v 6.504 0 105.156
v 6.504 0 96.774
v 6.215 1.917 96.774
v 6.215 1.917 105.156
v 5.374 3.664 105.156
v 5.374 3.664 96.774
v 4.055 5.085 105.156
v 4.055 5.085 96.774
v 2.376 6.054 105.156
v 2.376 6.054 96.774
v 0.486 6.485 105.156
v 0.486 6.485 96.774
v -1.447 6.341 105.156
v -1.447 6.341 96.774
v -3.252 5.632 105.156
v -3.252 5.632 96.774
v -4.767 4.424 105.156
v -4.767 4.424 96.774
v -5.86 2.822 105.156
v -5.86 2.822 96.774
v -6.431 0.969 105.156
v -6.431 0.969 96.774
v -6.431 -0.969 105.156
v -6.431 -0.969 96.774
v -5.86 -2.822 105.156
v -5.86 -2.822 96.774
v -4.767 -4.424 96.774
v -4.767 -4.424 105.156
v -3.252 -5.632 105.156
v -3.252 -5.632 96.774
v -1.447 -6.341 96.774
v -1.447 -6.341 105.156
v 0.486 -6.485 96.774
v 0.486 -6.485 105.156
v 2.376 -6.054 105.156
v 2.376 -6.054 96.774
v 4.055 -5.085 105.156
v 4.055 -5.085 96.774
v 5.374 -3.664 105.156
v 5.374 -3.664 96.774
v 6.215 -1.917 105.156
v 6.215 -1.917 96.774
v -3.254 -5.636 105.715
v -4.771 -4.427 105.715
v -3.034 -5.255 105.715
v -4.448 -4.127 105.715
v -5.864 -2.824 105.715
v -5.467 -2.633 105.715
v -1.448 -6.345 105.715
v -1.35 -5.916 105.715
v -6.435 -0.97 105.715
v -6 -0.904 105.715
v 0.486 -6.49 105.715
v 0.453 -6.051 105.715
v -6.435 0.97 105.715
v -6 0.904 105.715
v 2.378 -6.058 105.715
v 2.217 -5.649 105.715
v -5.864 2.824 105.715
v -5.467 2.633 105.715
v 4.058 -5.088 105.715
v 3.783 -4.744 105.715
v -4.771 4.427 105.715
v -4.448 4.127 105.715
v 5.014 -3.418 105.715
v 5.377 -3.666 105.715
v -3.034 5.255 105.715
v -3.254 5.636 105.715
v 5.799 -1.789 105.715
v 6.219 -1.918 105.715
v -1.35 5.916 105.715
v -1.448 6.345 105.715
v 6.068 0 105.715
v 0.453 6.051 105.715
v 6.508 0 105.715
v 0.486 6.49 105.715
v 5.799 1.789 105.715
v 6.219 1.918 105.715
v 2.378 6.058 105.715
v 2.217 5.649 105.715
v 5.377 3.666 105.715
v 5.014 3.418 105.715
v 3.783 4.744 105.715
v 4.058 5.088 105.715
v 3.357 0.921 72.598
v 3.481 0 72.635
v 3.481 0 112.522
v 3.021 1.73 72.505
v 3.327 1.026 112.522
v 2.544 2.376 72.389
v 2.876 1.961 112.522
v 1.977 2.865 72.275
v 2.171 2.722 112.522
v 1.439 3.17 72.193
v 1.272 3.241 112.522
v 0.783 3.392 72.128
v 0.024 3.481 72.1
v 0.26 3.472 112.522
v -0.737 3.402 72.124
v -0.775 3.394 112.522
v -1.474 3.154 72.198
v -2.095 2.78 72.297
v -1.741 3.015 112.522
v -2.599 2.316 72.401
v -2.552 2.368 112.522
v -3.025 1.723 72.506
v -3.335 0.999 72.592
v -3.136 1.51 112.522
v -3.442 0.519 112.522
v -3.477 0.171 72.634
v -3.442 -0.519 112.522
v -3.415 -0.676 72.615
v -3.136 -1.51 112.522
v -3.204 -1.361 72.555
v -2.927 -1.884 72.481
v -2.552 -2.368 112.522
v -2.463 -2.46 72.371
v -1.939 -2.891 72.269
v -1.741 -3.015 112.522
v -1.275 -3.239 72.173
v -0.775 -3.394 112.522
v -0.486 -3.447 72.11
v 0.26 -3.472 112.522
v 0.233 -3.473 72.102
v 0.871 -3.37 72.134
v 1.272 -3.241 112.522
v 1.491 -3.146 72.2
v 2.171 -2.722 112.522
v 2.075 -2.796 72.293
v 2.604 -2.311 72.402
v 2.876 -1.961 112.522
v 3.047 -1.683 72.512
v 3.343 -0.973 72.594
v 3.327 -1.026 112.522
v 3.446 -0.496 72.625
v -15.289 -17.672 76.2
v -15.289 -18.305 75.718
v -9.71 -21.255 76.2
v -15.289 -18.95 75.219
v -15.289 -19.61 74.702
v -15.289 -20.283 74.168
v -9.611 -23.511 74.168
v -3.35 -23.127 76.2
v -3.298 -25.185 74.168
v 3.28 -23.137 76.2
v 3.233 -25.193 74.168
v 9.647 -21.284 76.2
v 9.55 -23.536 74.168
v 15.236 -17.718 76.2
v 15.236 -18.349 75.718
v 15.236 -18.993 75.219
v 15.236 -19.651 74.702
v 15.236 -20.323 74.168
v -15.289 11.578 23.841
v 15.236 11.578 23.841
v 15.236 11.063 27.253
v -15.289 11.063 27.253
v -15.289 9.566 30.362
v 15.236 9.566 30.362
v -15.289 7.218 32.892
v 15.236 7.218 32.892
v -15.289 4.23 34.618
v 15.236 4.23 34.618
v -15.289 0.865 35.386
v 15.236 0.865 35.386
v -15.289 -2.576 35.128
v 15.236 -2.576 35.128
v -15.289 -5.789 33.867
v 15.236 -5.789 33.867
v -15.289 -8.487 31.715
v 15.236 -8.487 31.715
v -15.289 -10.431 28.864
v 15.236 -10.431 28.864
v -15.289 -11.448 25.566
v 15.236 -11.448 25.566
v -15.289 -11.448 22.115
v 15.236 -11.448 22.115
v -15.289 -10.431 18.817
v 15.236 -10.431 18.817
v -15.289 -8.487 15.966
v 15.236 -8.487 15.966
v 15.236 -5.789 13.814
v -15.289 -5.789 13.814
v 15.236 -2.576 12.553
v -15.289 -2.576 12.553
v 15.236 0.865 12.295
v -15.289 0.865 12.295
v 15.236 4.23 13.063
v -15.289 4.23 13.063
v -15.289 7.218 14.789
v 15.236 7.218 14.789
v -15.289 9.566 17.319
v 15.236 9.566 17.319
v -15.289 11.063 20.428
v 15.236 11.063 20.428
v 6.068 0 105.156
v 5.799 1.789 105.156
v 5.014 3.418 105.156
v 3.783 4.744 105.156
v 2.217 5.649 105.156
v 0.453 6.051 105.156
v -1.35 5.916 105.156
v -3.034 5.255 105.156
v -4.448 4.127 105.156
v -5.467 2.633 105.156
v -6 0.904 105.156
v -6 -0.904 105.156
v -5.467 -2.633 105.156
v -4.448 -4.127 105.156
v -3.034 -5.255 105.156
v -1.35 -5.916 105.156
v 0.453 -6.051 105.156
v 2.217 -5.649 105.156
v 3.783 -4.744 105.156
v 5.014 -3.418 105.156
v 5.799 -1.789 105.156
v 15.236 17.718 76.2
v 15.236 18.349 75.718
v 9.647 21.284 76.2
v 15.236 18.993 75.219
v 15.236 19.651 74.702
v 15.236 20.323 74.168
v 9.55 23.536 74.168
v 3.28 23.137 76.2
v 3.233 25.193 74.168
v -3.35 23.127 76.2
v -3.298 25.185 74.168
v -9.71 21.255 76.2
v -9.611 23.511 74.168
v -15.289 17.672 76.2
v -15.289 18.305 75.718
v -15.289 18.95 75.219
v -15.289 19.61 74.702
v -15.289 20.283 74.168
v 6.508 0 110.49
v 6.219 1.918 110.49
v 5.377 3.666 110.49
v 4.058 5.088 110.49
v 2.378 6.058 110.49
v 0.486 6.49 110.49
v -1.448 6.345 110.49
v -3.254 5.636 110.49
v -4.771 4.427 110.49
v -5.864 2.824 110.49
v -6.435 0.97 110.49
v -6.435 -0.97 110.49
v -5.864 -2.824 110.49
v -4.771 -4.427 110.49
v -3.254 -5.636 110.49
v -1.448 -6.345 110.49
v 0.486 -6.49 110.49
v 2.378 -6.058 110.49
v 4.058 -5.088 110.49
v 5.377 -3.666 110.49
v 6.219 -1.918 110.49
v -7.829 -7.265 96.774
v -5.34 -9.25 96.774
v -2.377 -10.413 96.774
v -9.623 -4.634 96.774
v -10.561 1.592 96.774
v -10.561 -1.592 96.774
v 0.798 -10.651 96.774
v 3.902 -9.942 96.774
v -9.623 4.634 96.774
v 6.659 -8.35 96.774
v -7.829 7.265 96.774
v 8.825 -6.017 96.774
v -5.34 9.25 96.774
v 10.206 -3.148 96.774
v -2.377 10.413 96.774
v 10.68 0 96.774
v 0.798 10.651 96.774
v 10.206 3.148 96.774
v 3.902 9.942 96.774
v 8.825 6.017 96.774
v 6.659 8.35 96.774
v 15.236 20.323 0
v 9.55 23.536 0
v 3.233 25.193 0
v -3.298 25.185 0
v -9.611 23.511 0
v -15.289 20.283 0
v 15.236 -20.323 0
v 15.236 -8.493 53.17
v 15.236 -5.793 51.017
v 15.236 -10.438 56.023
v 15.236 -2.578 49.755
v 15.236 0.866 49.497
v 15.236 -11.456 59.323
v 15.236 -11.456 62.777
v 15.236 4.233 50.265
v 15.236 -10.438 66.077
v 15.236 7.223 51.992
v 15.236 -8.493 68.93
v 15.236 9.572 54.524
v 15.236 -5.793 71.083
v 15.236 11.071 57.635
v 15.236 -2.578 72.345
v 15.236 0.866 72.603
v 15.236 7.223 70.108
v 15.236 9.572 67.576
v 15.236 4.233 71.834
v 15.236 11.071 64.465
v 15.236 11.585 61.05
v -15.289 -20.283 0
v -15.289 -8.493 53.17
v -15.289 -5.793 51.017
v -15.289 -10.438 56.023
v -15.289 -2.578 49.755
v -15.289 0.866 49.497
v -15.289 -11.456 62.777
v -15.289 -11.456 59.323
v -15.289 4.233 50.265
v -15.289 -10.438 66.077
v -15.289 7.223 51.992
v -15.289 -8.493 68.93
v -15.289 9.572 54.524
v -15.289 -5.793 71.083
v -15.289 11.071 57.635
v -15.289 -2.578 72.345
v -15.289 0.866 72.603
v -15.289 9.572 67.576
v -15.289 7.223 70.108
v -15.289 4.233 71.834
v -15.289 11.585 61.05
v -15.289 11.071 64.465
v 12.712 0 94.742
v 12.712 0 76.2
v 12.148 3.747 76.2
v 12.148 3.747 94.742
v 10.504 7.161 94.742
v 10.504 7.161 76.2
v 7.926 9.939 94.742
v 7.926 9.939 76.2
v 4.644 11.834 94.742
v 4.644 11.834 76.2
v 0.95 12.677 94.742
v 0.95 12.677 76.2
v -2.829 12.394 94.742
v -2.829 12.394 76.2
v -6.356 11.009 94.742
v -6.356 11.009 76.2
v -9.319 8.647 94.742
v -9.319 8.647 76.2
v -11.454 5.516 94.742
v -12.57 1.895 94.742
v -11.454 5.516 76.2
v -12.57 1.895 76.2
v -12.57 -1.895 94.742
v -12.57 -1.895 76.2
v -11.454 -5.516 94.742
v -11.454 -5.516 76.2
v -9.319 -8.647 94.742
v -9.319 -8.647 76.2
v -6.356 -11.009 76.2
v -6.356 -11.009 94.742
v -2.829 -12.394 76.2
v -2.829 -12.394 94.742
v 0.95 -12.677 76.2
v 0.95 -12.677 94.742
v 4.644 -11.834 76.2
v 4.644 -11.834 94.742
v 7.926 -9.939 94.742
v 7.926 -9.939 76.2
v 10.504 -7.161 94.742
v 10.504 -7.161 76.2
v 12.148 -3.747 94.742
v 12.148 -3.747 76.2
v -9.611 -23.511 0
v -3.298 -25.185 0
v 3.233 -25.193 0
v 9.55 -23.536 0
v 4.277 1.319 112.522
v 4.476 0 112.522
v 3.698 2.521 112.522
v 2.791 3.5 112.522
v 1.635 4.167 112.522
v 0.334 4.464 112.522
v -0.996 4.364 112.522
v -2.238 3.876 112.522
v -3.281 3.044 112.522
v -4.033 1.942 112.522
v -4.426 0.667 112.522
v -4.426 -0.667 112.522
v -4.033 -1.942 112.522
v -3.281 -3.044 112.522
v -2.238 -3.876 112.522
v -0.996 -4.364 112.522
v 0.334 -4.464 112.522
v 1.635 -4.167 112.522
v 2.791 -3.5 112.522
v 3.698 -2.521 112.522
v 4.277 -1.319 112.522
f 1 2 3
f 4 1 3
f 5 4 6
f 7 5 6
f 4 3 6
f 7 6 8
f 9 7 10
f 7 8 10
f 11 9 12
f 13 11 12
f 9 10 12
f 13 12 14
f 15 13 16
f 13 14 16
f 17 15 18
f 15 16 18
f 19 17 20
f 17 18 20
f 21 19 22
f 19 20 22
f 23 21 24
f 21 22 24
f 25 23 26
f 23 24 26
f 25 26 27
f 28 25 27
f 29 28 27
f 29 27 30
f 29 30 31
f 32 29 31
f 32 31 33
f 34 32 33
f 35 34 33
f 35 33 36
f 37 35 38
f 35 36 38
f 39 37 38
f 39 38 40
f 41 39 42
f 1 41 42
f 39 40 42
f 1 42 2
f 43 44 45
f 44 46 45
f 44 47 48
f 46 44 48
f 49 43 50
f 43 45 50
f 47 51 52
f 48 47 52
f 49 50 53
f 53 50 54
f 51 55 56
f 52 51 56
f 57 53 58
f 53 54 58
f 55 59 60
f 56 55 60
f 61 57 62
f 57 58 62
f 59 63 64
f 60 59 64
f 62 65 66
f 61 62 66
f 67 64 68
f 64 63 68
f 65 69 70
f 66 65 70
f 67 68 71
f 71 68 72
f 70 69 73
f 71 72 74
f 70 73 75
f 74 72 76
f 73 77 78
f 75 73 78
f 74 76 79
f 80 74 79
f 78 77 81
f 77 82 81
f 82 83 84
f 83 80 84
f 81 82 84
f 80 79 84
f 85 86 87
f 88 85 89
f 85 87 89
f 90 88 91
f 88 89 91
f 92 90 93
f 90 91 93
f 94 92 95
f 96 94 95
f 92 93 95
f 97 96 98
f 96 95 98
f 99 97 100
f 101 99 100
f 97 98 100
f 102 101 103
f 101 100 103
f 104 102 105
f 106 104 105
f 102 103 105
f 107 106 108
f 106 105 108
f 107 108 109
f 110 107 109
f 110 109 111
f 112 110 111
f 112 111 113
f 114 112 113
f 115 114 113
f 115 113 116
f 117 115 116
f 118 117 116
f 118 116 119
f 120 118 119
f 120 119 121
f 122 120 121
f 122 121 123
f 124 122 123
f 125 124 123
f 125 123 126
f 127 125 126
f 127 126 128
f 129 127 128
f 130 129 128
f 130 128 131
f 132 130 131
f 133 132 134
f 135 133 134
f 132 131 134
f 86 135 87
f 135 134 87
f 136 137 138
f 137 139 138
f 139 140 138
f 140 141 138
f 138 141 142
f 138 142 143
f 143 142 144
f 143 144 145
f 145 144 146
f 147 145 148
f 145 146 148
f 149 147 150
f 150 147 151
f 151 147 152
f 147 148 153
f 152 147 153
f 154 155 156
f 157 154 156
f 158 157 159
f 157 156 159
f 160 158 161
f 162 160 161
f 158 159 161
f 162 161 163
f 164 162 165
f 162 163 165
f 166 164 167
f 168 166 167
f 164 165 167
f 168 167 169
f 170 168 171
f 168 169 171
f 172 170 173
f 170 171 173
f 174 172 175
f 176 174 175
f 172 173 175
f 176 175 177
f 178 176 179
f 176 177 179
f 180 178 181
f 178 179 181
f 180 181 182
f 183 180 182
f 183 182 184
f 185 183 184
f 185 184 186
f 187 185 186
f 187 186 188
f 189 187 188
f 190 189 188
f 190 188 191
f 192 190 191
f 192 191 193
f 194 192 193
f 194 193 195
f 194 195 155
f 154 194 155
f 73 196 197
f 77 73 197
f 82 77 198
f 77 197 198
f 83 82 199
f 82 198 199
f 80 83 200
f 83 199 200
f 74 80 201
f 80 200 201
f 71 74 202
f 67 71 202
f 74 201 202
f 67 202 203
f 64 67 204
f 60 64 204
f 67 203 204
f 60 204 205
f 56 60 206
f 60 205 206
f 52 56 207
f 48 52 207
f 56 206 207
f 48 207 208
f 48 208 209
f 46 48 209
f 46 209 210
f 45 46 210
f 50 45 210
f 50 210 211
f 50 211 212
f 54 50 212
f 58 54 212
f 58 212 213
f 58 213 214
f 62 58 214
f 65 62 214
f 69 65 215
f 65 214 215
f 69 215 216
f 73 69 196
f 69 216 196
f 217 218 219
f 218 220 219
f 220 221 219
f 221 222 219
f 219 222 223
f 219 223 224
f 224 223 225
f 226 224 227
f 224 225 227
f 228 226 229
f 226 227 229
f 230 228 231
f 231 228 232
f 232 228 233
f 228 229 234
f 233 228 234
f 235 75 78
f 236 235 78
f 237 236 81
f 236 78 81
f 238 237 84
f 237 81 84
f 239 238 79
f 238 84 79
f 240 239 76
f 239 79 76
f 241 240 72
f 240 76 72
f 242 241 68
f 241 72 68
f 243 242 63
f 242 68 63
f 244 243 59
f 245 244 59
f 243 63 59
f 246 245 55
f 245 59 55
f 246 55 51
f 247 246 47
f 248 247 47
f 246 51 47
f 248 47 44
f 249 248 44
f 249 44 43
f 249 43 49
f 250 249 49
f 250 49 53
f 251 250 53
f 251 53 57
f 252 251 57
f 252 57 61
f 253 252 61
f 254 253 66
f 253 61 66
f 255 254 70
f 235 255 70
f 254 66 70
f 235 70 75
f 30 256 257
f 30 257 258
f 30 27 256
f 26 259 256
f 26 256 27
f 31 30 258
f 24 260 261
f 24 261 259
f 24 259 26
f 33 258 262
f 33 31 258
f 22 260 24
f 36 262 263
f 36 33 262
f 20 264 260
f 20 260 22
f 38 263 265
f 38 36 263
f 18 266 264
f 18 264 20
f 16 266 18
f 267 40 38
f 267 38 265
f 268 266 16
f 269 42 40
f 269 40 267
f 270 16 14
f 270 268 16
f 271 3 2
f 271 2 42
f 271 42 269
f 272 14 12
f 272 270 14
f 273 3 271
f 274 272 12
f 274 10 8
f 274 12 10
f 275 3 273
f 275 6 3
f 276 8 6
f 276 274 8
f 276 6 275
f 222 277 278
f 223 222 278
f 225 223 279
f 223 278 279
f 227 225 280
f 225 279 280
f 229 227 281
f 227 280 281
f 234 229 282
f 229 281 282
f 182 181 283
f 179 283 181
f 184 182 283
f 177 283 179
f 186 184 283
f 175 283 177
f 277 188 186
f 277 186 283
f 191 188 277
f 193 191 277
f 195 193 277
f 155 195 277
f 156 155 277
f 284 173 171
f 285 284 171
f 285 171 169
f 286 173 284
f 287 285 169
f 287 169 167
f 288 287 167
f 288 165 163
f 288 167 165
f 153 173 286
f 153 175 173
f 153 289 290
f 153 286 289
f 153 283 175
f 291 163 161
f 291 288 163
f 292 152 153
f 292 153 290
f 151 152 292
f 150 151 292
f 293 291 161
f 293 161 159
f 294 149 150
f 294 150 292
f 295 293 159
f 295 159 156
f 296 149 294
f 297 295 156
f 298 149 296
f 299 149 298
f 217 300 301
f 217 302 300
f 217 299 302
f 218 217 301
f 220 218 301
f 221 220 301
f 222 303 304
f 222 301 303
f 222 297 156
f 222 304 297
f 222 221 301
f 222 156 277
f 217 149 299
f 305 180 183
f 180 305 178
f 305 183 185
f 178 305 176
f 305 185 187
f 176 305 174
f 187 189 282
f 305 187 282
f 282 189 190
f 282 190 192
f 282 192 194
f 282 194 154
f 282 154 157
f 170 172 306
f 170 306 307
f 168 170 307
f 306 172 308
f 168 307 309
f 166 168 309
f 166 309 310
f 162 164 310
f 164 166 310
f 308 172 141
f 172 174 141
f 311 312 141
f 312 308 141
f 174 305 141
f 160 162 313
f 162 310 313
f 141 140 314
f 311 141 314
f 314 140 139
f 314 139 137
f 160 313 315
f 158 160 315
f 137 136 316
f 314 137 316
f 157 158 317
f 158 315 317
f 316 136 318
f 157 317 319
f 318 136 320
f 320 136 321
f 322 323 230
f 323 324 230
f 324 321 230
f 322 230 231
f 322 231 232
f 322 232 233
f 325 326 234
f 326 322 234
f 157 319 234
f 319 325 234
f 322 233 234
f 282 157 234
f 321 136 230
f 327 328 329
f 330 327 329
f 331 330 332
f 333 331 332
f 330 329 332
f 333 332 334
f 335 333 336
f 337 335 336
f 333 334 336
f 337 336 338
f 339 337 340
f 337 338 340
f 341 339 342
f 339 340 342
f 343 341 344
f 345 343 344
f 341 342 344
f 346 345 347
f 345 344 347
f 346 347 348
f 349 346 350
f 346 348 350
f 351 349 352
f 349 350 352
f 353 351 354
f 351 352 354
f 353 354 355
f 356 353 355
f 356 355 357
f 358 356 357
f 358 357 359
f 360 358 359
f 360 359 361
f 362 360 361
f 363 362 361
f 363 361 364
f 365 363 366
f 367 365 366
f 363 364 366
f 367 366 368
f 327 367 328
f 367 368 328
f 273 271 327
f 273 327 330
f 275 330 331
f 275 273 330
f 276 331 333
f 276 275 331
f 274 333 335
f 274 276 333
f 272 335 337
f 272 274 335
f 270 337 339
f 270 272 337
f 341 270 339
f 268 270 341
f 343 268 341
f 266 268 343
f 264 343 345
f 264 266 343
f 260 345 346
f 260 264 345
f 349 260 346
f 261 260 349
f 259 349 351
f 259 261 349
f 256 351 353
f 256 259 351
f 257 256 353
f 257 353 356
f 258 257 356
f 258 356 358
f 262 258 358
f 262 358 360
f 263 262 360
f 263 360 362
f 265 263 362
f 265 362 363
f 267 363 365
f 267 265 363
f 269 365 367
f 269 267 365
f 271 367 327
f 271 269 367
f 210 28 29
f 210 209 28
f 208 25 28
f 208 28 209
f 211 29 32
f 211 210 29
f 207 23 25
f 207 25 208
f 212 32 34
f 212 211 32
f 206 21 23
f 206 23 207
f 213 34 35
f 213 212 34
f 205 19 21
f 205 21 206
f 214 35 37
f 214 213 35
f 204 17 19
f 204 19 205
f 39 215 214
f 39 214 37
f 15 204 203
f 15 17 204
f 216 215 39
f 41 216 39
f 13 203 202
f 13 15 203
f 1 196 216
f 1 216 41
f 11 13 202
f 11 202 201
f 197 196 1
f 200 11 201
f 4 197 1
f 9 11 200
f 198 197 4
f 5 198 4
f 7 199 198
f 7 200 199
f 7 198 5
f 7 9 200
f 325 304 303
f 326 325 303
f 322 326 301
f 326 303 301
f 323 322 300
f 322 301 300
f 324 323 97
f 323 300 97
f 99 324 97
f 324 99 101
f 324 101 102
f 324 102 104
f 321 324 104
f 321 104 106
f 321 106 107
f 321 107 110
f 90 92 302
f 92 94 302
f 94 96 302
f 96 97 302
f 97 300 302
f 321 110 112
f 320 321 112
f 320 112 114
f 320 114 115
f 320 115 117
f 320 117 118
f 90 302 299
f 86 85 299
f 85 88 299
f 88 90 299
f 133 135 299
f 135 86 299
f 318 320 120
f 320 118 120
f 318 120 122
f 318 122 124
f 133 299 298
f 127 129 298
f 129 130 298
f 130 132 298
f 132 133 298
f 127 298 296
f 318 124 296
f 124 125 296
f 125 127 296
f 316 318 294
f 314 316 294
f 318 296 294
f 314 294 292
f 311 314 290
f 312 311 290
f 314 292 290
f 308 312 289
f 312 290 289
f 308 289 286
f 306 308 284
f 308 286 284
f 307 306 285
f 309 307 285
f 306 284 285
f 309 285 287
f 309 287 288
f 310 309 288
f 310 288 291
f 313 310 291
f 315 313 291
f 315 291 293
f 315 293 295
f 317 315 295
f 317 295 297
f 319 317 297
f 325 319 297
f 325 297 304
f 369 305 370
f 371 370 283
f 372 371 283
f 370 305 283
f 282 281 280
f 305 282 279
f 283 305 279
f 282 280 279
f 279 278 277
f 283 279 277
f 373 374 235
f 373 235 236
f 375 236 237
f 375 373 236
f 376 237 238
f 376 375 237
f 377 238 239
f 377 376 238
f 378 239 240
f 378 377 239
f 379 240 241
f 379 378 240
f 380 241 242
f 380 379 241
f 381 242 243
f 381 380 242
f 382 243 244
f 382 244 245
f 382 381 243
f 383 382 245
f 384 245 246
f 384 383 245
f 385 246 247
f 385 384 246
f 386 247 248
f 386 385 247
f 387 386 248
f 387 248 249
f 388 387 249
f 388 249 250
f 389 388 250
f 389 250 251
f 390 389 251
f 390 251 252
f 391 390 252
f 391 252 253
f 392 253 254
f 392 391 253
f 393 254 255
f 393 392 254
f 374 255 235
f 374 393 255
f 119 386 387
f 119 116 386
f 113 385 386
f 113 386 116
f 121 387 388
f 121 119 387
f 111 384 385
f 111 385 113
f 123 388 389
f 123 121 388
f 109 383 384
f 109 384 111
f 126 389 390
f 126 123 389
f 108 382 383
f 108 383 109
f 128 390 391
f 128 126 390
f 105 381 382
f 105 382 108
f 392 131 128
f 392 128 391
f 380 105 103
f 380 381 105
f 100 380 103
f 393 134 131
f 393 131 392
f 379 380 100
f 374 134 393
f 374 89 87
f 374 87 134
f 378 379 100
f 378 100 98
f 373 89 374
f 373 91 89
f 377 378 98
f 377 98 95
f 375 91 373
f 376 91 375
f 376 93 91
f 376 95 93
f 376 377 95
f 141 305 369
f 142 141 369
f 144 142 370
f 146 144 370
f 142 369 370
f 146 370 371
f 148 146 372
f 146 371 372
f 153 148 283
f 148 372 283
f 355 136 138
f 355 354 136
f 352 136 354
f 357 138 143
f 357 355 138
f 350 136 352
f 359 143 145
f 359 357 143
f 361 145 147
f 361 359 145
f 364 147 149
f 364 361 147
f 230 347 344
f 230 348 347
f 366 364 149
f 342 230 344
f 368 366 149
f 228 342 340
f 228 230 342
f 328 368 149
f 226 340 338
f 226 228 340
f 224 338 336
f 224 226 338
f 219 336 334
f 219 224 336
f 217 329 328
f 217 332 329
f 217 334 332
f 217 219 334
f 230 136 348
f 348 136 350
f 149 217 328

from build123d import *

# Parameters (mm, degrees)
F0_R      = 25.4
F1_DEPTH  = 76.2
F2_R      = 12.7124561547
F3_DEPTH  = 20.574
F4_R      = 6.5036133295
F5_DEPTH  = 8.382
F6_R      = 5.5261881266
F7_DEPTH  = 0.3556
F8_R      = 6.0681325209
F9_DEPTH  = 0.5588
F10_R     = 6.5080423993
F11_DEPTH = 6.8072
F12_W     = 12.8267863765
F12_H     = 46.3458411396
F13_DEPTH = 254
F14_W     = 15.4017303139
F14_H     = 51.6813602298
F15_DEPTH = 254
F16_R     = 11.58530812
F17_DEPTH = 254
F18_R     = 11.5775255265
F19_DEPTH = 254
F20_SIZE  = 2.032
F21_SIZE  = 2.032
F24_R     = 3.4812427805
F25_DEPTH = 50.8


# Not quite as in the source:
# - two fillets or chamfers of one size are made in one step


with BuildPart() as f1:
    # F0 (on Top) → F1 (new body)
    with BuildSketch(Plane.XY):
        Circle(F0_R)
    extrude(amount=F1_DEPTH)

    # F2 (on face) → F3 (join)
    with BuildSketch(Plane.XY.offset(76.2)):
        Circle(F2_R)
    extrude(amount=F3_DEPTH)

    # F4 (on face) → F5 (join)
    with BuildSketch(Plane.XY.offset(96.774)):
        Circle(F4_R)
    extrude(amount=F5_DEPTH)

    # F6 (on face) → F7 (join)
    with BuildSketch(Plane.XY.offset(105.156)):
        Circle(F6_R)
    extrude(amount=-F7_DEPTH)

    # F8 (on face) → F9 (join)
    with BuildSketch(Plane.XY.offset(105.156)):
        Circle(F8_R)
    extrude(amount=F9_DEPTH)

    # F10 (on face) → F11 (join)
    with BuildSketch(Plane.XY.offset(105.7148)):
        Circle(F10_R)
    extrude(amount=F11_DEPTH)

    # F12 (on face) → F13 (cut)
    with BuildSketch(Plane.XY.offset(76.2)):
        with Locations((-21.7024399899, -0.1023318619)):
            Rectangle(F12_W, F12_H)
    extrude(amount=-F13_DEPTH, mode=Mode.SUBTRACT)

    # F14 (on face) → F15 (cut)
    with BuildSketch(Plane.XY.offset(76.2)):
        with Locations((22.9368926957, -0.5596792325)):
            Rectangle(F14_W, F14_H)
    extrude(amount=-F15_DEPTH, mode=Mode.SUBTRACT)

    # F16 (on face) → F17 (cut)
    with BuildSketch(Plane.YZ.offset(15.2360275388)):
        with Locations((0, 61.0498785973)):
            Circle(F16_R)
    extrude(amount=-F17_DEPTH, mode=Mode.SUBTRACT)

    # F18 (on face) → F19 (cut)
    with BuildSketch(Plane.YZ.offset(15.2360275388)):
        with Locations((0, 23.8405317068)):
            Circle(F18_R)
    extrude(amount=-F19_DEPTH, mode=Mode.SUBTRACT)

    # F20
    f20_edges = [f1.edges().sort_by_distance(p)[0] for p in [
        (-0.033165, 25.399978, 76.2),
        (-0.033165, -25.399978, 76.2),
    ]]
    chamfer(f20_edges, length=F20_SIZE)

    # F21
    f21_edges = [f1.edges().sort_by_distance(p)[0] for p in [
        (-12.712456, 0, 96.774),
        (-6.508042, 0, 112.522),
    ]]
    chamfer(f21_edges, length=F21_SIZE)

    # F24 (on face) → F25 (cut)
    with BuildSketch(Plane.XY.offset(112.522)):
        Circle(F24_R)
    extrude(amount=-F25_DEPTH, mode=Mode.SUBTRACT)


solid = f1.part
